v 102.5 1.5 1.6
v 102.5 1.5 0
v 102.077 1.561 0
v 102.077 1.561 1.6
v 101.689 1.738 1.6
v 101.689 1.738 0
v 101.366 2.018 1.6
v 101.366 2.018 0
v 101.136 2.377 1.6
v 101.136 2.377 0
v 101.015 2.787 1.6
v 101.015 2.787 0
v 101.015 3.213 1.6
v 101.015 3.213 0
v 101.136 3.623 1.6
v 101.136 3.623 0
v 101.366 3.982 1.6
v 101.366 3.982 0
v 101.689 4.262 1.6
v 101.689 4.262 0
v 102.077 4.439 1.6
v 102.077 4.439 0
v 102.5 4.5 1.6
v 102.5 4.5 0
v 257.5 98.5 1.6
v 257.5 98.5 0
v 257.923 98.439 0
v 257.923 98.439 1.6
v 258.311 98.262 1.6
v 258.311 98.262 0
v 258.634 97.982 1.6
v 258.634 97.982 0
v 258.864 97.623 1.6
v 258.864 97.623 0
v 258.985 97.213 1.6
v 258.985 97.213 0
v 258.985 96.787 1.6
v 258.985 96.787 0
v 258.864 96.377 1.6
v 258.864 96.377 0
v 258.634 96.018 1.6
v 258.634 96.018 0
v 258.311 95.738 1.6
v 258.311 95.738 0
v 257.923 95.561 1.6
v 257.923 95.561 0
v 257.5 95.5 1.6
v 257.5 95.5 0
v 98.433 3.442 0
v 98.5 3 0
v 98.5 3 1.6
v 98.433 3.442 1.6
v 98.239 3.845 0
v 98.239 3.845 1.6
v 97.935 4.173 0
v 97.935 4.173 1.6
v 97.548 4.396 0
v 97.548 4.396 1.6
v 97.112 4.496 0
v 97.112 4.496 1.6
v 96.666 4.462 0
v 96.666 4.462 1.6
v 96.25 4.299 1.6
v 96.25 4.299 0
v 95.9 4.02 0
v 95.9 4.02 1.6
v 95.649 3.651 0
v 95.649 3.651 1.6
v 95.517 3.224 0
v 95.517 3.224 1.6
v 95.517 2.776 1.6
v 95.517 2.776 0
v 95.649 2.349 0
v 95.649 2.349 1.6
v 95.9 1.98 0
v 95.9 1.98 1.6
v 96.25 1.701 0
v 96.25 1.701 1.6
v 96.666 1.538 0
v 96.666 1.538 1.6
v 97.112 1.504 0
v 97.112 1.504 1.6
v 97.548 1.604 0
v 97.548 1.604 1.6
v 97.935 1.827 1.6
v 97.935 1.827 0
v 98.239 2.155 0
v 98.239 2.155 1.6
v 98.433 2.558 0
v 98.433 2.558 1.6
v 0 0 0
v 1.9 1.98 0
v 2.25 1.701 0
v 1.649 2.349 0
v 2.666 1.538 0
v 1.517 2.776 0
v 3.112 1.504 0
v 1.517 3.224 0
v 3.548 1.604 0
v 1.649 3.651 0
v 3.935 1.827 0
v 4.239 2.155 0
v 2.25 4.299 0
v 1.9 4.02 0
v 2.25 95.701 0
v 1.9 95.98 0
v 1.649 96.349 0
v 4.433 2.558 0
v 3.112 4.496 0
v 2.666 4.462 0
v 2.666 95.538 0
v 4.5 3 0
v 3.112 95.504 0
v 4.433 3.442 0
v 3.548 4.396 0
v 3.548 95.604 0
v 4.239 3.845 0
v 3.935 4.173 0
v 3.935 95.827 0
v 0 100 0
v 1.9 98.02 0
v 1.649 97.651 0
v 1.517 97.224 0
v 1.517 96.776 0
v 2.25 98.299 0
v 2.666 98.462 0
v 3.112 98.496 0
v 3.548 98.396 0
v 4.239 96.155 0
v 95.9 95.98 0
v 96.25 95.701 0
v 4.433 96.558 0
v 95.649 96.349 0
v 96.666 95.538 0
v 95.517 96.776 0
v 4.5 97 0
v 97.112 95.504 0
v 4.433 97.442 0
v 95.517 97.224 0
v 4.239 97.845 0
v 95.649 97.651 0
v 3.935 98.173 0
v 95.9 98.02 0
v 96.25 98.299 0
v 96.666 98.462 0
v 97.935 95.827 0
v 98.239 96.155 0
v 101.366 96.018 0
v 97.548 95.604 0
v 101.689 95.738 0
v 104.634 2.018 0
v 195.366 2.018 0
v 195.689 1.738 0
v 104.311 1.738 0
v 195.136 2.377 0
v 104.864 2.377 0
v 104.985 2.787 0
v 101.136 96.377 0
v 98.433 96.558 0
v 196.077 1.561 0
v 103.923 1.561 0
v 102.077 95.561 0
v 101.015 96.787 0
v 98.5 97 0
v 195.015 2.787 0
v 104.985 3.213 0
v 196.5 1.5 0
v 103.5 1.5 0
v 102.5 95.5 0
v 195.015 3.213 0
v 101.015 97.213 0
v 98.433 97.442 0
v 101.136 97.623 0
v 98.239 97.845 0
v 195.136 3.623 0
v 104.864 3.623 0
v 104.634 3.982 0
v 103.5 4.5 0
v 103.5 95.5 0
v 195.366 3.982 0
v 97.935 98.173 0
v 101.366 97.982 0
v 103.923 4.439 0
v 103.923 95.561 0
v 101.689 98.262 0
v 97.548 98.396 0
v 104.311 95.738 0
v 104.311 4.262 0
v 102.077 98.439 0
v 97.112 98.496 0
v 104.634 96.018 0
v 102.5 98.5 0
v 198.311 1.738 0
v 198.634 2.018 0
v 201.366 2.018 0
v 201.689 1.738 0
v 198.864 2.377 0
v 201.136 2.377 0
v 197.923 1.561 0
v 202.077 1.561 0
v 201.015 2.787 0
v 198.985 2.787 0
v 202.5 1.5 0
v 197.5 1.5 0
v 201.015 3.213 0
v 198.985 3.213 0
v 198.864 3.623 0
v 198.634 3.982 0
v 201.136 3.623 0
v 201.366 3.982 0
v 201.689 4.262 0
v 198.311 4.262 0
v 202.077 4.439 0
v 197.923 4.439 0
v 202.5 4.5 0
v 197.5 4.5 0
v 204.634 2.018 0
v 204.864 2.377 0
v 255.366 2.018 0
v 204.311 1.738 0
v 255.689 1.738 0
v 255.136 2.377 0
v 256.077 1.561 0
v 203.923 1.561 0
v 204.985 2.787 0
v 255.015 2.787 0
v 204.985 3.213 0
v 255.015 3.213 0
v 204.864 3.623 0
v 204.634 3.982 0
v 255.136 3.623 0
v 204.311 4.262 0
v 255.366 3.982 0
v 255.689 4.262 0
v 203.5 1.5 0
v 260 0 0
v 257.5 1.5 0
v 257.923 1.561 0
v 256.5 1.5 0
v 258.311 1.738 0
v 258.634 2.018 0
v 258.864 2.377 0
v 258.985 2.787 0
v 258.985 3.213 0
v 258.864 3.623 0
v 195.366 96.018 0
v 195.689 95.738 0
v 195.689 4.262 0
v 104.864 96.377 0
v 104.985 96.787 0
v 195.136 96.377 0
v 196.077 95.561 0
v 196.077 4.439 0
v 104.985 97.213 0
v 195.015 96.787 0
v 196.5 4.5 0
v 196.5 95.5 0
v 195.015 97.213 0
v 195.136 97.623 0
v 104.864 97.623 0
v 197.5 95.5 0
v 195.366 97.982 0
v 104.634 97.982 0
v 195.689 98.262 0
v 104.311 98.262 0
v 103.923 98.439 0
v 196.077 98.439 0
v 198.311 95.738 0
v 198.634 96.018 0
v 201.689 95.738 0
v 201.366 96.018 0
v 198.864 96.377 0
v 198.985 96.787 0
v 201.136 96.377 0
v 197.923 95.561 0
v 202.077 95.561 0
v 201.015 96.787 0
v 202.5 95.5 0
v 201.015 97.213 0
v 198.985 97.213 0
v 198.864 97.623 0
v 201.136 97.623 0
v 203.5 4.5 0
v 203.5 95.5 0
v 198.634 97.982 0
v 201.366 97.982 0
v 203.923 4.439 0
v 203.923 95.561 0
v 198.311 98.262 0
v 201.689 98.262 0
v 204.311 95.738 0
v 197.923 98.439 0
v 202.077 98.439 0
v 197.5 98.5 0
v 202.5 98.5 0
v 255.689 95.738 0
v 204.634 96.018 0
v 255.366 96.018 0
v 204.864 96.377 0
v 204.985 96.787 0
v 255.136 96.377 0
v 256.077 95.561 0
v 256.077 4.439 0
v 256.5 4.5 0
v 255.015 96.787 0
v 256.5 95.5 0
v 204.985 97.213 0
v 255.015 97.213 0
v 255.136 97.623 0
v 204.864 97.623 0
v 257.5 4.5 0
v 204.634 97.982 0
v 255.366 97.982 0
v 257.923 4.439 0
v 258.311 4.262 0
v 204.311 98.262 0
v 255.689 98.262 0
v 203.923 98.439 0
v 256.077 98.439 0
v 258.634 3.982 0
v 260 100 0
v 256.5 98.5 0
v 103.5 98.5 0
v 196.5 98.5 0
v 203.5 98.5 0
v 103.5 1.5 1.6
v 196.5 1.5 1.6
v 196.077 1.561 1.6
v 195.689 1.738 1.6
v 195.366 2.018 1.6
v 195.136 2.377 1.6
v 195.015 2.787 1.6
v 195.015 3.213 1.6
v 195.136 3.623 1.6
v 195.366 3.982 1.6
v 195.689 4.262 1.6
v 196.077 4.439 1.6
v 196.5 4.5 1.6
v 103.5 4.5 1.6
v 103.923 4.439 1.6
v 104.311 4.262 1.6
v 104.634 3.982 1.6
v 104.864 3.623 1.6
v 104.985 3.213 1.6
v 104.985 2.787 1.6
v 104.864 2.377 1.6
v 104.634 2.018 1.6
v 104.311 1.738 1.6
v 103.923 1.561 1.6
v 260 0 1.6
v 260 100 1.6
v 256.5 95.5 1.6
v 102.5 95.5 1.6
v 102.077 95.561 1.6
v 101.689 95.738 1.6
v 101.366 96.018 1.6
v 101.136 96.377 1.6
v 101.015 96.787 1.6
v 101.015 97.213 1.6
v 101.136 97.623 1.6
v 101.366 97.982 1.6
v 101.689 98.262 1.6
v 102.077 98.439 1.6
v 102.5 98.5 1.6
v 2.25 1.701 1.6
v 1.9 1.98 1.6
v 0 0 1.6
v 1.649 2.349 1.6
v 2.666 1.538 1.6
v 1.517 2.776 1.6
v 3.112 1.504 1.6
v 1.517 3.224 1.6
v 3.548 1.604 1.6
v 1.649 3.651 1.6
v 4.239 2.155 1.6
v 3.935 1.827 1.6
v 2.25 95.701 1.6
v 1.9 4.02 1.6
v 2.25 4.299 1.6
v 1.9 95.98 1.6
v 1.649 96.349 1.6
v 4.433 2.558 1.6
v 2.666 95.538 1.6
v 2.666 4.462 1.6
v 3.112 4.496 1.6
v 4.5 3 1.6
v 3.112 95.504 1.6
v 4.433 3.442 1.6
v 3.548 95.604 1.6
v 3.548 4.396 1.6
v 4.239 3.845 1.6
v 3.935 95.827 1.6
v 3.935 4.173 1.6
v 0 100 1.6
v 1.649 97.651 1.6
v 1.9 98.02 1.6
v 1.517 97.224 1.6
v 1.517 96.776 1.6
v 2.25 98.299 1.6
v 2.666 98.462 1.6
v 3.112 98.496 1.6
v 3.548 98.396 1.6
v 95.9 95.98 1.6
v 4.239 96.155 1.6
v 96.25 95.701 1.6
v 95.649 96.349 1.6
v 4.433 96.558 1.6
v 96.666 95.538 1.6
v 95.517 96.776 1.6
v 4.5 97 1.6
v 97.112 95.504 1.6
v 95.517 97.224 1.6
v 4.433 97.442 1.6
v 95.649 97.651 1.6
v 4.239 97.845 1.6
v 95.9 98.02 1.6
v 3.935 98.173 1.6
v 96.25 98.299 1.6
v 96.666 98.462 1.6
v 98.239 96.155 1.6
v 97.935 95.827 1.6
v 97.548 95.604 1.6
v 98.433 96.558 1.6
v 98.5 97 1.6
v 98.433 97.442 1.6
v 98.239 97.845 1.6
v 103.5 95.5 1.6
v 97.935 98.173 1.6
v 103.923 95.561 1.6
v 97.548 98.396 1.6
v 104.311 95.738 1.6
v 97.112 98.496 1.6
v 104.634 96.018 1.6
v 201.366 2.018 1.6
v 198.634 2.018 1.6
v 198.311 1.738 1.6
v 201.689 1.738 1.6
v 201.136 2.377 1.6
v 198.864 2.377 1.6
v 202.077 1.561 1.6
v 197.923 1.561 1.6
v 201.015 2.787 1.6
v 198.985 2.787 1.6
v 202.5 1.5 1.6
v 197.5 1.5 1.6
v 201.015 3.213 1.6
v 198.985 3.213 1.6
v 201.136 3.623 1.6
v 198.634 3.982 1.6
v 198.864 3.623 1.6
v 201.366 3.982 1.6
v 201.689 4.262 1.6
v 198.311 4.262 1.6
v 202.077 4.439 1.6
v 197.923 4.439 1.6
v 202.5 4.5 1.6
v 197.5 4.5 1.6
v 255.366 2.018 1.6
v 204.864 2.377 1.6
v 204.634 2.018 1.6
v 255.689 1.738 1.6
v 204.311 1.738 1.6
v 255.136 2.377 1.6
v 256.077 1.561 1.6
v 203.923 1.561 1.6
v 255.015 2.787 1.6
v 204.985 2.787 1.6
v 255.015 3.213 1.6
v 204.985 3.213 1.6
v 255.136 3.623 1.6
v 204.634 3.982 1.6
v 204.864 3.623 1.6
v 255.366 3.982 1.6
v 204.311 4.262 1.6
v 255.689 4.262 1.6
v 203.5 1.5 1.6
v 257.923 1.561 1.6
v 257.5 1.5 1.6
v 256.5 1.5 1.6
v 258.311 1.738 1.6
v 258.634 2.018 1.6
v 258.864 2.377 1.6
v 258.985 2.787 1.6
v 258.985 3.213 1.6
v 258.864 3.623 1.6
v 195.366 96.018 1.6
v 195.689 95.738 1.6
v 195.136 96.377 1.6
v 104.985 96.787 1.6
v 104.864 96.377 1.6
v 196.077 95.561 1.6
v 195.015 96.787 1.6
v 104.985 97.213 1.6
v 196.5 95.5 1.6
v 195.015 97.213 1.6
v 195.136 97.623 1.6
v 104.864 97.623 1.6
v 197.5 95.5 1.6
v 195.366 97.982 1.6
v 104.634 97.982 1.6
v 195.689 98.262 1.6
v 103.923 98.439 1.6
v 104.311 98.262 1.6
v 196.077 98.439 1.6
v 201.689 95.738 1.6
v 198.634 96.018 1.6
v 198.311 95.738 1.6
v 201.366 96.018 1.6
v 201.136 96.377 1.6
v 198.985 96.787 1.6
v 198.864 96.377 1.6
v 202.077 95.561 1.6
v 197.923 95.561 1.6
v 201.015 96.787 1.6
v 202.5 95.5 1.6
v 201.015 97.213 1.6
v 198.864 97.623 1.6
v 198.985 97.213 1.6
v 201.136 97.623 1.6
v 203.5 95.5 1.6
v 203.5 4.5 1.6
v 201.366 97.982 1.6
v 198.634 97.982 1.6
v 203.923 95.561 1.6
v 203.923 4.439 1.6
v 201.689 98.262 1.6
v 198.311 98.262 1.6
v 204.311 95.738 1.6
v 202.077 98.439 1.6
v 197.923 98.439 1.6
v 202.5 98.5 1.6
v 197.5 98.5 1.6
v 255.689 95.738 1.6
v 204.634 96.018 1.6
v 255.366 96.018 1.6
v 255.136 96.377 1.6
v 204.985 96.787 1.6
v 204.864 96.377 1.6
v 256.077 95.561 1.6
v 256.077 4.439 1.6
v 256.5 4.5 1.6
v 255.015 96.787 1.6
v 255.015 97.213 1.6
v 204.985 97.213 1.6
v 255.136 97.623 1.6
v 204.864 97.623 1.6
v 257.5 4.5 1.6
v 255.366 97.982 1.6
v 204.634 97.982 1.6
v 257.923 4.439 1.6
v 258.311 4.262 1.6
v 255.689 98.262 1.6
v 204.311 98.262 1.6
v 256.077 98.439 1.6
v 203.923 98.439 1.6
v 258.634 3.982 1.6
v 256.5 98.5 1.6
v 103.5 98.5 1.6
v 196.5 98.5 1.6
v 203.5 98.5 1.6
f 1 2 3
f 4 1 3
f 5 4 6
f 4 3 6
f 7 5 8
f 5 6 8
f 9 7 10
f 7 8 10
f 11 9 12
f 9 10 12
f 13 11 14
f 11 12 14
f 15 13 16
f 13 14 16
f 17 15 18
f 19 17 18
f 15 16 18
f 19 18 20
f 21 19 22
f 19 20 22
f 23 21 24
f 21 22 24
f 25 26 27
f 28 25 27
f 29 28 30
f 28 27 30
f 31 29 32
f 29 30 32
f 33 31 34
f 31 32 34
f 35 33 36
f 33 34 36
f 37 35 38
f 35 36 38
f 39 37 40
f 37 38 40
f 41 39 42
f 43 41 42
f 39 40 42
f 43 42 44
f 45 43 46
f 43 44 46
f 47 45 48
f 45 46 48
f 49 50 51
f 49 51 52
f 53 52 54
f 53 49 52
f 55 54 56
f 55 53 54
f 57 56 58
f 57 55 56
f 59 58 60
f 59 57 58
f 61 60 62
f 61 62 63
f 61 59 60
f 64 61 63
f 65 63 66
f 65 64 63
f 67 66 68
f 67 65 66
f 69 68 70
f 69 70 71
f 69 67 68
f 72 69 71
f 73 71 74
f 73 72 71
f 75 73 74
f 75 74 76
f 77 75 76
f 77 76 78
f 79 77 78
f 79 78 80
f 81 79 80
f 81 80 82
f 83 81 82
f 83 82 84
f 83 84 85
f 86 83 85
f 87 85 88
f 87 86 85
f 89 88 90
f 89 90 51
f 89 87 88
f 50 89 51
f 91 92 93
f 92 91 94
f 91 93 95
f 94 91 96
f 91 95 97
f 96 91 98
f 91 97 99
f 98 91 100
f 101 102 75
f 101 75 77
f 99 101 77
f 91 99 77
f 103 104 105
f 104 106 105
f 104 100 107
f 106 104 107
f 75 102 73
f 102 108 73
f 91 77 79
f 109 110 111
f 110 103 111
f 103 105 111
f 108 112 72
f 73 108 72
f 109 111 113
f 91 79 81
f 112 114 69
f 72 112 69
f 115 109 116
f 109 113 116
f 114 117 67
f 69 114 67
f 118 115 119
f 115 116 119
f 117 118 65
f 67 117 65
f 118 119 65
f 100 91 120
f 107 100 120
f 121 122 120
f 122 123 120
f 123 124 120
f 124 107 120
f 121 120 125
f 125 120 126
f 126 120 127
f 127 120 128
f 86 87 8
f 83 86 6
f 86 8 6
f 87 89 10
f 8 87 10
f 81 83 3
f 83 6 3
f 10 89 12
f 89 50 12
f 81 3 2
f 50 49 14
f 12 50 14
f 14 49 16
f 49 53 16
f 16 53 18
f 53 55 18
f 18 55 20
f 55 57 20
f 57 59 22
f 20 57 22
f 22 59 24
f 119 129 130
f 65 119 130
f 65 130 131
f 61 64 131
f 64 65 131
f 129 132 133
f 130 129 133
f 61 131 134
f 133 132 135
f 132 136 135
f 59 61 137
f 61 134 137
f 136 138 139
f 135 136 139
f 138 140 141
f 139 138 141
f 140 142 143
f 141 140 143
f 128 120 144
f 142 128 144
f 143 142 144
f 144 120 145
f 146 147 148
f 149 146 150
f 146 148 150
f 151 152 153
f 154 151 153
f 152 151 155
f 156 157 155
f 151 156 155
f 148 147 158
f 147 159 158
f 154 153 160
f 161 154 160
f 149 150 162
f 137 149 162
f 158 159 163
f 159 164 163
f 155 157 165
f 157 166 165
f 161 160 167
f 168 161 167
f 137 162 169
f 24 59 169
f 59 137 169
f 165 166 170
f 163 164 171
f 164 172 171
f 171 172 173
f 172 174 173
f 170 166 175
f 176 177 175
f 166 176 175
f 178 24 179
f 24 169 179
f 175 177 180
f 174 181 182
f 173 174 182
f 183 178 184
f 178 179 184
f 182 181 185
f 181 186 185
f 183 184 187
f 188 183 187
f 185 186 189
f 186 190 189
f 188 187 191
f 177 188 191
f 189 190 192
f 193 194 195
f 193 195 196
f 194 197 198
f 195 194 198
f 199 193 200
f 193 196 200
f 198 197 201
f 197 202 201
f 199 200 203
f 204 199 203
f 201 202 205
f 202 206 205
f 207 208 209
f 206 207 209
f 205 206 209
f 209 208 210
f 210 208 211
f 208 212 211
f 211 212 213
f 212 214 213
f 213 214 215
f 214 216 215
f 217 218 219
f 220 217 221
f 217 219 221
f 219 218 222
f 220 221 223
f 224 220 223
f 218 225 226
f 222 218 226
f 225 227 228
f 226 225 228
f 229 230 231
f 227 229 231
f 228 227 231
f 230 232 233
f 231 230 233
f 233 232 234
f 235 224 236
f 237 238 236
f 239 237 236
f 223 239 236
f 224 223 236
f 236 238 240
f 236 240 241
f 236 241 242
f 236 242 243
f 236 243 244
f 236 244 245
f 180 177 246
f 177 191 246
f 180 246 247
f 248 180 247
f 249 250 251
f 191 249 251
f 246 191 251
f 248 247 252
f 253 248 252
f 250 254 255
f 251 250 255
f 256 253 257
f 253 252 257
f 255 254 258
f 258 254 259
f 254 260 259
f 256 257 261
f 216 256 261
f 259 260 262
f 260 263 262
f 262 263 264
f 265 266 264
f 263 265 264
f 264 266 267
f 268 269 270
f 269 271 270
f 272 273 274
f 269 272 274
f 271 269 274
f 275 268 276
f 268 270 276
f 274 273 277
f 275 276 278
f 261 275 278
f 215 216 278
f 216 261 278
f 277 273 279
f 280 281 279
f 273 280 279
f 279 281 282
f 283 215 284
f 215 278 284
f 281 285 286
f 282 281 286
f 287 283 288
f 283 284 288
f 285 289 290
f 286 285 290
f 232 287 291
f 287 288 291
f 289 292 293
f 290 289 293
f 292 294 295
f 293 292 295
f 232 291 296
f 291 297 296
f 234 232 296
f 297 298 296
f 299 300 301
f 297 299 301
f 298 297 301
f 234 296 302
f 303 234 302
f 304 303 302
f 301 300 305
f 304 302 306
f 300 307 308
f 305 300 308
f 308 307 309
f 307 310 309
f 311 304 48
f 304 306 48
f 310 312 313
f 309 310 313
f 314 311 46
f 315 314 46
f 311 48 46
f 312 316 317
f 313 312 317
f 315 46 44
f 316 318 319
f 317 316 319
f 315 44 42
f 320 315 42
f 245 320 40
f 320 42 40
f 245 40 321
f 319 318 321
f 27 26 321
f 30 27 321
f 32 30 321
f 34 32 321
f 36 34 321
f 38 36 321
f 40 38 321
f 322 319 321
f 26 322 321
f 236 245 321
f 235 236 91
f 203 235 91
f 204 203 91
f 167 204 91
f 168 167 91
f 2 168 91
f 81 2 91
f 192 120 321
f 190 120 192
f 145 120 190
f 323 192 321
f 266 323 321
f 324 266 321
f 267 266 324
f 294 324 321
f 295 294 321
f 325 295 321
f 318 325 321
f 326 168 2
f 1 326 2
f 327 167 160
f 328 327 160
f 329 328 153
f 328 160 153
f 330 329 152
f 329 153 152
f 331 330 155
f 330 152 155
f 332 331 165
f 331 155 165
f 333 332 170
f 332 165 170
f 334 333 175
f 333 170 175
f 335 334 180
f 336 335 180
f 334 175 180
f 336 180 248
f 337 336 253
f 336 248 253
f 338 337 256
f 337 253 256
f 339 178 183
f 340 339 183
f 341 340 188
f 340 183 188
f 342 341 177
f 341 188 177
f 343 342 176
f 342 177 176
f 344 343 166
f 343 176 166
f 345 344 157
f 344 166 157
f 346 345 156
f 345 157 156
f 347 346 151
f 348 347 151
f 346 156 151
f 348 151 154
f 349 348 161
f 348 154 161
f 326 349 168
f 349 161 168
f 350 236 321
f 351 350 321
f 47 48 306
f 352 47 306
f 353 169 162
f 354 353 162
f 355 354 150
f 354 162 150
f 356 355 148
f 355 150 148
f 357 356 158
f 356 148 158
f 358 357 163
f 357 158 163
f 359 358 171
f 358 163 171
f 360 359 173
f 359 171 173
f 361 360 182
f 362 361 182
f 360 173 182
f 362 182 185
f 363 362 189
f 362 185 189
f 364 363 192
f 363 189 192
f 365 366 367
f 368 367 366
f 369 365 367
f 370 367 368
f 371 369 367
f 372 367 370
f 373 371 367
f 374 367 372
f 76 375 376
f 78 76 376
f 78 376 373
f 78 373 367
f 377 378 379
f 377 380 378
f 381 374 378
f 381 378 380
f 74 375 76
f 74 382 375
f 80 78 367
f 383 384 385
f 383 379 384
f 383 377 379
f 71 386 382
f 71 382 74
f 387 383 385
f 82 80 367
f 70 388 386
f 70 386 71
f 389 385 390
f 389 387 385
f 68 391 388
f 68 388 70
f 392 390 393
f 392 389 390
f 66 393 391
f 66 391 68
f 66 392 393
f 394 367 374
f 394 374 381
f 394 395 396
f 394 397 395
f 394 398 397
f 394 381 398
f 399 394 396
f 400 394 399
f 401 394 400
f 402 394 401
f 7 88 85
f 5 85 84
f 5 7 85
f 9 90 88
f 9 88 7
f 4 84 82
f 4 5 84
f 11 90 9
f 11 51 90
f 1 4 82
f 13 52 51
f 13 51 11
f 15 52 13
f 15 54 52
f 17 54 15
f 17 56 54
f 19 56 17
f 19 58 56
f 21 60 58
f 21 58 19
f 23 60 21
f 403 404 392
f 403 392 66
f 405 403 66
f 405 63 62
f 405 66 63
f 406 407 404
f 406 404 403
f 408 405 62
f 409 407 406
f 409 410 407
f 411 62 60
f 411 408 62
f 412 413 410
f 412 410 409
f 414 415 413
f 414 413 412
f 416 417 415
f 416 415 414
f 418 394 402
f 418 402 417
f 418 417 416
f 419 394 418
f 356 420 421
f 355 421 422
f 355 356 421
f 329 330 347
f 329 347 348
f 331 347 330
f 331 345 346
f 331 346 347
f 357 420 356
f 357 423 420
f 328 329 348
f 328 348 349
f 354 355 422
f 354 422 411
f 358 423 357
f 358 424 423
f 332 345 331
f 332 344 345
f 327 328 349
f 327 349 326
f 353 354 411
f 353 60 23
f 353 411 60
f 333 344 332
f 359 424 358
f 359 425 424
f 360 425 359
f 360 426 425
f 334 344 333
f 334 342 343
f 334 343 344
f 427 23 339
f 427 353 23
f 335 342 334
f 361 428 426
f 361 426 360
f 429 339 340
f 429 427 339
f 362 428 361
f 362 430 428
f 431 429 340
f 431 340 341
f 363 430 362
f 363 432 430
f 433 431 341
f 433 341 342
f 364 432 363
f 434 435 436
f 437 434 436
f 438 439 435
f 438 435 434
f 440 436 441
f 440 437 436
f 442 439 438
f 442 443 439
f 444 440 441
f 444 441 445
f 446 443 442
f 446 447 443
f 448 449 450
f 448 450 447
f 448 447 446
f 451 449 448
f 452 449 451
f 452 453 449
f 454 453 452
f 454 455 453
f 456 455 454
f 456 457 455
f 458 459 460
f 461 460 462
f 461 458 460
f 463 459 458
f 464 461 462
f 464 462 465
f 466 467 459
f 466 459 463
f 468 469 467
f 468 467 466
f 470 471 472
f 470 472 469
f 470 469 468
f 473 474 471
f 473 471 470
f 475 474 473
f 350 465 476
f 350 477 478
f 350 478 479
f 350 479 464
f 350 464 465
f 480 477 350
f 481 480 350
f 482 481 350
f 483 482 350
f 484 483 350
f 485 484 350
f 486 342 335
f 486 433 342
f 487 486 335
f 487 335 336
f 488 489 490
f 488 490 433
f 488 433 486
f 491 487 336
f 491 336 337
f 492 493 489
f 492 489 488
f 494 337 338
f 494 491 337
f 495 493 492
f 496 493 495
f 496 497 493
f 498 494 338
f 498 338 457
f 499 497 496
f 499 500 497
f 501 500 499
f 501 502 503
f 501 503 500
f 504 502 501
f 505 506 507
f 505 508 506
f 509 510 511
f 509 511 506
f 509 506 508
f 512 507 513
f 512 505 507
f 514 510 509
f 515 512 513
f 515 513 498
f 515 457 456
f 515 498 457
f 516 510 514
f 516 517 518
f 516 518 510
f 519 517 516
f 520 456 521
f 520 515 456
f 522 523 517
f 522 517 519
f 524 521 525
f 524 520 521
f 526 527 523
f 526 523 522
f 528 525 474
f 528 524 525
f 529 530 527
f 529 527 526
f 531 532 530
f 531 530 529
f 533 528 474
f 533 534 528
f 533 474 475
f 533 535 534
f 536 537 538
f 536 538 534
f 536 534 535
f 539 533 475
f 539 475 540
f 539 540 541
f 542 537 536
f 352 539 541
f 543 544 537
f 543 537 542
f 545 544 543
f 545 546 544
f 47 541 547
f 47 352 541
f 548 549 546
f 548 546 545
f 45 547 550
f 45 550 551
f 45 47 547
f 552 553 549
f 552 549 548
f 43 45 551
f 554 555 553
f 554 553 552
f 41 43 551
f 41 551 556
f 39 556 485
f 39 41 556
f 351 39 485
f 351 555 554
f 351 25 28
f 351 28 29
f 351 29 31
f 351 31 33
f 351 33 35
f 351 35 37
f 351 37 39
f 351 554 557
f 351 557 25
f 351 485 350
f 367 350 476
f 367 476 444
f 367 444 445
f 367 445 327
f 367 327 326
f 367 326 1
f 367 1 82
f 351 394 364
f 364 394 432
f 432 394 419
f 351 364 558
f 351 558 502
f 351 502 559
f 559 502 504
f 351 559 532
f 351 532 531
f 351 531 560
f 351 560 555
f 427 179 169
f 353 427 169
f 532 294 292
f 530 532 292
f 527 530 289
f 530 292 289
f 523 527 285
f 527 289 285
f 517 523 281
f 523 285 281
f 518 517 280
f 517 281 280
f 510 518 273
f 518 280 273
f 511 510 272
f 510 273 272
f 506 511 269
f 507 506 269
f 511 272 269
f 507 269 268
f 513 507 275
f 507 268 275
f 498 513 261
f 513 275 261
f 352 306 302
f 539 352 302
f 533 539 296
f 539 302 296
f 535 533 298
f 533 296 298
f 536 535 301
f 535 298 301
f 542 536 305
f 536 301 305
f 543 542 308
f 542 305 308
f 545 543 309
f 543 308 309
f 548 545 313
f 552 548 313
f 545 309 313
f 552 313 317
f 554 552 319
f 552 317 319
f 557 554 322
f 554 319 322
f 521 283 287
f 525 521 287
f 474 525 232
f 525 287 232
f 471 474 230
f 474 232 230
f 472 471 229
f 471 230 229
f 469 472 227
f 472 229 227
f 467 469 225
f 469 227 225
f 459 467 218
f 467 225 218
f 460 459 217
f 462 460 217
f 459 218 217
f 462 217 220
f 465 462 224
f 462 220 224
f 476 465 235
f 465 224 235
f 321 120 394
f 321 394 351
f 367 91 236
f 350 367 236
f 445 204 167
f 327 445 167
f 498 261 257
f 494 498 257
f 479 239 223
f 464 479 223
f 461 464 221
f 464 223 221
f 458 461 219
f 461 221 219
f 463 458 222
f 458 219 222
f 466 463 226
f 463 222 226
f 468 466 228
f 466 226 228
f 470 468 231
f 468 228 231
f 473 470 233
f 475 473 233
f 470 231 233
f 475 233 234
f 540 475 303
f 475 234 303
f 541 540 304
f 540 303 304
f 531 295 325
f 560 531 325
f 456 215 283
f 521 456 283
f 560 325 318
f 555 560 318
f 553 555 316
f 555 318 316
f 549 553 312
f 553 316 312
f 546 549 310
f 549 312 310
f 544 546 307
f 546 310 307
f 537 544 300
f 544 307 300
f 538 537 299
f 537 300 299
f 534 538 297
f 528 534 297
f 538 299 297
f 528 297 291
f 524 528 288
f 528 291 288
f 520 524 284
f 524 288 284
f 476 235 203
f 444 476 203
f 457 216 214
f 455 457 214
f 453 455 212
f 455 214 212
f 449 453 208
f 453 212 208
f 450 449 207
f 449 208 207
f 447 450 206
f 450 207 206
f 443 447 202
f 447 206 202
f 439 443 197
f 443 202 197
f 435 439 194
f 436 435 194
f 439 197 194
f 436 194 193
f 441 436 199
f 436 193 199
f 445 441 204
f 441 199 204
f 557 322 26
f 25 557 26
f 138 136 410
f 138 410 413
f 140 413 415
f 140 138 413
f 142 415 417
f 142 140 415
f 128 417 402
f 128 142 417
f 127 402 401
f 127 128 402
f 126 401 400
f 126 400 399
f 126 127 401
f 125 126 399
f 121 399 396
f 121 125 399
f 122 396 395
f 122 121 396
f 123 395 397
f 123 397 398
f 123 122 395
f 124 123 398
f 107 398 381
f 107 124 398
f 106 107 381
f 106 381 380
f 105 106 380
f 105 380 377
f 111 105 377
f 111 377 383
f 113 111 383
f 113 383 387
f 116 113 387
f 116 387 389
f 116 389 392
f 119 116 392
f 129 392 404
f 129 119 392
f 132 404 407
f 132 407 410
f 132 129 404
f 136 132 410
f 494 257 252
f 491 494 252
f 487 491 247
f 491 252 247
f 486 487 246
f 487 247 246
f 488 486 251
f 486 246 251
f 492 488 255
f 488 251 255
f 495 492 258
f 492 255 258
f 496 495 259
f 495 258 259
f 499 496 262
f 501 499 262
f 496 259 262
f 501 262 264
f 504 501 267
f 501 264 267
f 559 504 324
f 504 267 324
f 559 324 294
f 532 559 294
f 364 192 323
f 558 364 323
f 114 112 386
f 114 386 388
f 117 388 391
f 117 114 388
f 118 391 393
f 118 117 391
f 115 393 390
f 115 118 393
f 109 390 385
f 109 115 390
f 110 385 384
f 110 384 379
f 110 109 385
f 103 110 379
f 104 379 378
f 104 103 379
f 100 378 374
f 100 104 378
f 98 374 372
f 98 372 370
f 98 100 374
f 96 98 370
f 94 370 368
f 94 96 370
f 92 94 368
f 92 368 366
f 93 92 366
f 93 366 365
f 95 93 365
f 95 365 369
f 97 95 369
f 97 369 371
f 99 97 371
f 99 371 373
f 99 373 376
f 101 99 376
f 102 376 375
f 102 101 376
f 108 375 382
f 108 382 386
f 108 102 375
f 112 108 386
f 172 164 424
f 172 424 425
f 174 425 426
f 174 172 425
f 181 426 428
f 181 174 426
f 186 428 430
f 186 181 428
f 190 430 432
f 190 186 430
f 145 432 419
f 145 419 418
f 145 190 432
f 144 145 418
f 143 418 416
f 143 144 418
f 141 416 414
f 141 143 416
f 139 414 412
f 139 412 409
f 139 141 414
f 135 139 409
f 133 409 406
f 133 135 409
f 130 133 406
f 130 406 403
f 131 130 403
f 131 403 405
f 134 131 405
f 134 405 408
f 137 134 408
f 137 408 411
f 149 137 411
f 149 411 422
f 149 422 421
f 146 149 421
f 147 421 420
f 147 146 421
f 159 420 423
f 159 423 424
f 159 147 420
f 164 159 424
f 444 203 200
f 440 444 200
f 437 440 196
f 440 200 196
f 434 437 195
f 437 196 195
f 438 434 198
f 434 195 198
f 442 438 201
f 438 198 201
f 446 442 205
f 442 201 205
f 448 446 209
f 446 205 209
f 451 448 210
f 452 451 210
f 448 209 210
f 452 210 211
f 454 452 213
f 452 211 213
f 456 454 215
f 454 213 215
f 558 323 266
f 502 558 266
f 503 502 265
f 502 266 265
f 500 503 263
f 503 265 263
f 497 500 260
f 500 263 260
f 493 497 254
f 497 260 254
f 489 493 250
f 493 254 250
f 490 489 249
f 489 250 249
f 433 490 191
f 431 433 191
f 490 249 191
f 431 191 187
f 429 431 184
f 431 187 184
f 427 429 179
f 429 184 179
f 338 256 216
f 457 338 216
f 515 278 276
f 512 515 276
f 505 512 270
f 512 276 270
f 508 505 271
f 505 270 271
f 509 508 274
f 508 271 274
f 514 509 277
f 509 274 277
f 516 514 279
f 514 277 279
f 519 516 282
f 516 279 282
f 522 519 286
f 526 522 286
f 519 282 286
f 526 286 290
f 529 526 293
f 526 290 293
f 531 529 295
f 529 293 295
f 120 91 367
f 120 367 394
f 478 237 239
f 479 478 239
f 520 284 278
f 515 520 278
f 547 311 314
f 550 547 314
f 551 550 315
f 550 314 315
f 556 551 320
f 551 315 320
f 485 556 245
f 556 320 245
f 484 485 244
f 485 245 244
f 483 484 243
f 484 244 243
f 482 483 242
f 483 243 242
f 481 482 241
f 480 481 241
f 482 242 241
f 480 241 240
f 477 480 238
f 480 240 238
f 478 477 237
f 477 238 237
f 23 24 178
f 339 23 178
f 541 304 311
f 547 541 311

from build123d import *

# Parameters (mm, degrees)
SKETCH_1_W      = 260
SKETCH_1_H      = 100
SKETCH_1_R      = 1.5
EXTRUDE_1_DEPTH = 1.6


with BuildPart() as part:
    # 草图1 → 凸台-拉伸1 (new body)
    with BuildSketch(Plane.XY):
        with Locations((130, 50)):
            Rectangle(SKETCH_1_W, SKETCH_1_H)
        with Locations((3, 3)):
            Circle(SKETCH_1_R, mode=Mode.SUBTRACT)
        with Locations((3, 97)):
            Circle(SKETCH_1_R, mode=Mode.SUBTRACT)
        with Locations((97, 97)):
            Circle(SKETCH_1_R, mode=Mode.SUBTRACT)
        with Locations((97, 3)):
            Circle(SKETCH_1_R, mode=Mode.SUBTRACT)
        with BuildLine():
            Line((102.5, 98.5), (103.5, 98.5))
            ThreePointArc((103.5, 98.5), (105, 97), (103.5, 95.5))
            Line((103.5, 95.5), (102.5, 95.5))
            ThreePointArc((102.5, 95.5), (101, 97), (102.5, 98.5))
        make_face(mode=Mode.SUBTRACT)
        with BuildLine():
            Line((102.5, 4.5), (103.5, 4.5))
            ThreePointArc((103.5, 4.5), (105, 3), (103.5, 1.5))
            Line((103.5, 1.5), (102.5, 1.5))
            ThreePointArc((102.5, 1.5), (101, 3), (102.5, 4.5))
        make_face(mode=Mode.SUBTRACT)
        with BuildLine():
            Line((196.5, 98.5), (197.5, 98.5))
            ThreePointArc((197.5, 98.5), (199, 97), (197.5, 95.5))
            Line((197.5, 95.5), (196.5, 95.5))
            ThreePointArc((196.5, 95.5), (195, 97), (196.5, 98.5))
        make_face(mode=Mode.SUBTRACT)
        with BuildLine():
            Line((196.5, 4.5), (197.5, 4.5))
            ThreePointArc((197.5, 4.5), (199, 3), (197.5, 1.5))
            Line((197.5, 1.5), (196.5, 1.5))
            ThreePointArc((196.5, 1.5), (195, 3), (196.5, 4.5))
        make_face(mode=Mode.SUBTRACT)
        with BuildLine():
            Line((202.5, 4.5), (203.5, 4.5))
            ThreePointArc((203.5, 4.5), (205, 3), (203.5, 1.5))
            Line((203.5, 1.5), (202.5, 1.5))
            ThreePointArc((202.5, 1.5), (201, 3), (202.5, 4.5))
        make_face(mode=Mode.SUBTRACT)
        with BuildLine():
            Line((202.5, 98.5), (203.5, 98.5))
            ThreePointArc((203.5, 98.5), (205, 97), (203.5, 95.5))
            Line((203.5, 95.5), (202.5, 95.5))
            ThreePointArc((202.5, 95.5), (201, 97), (202.5, 98.5))
        make_face(mode=Mode.SUBTRACT)
        with BuildLine():
            Line((257.5, 95.5), (256.5, 95.5))
            ThreePointArc((256.5, 95.5), (255, 97), (256.5, 98.5))
            Line((256.5, 98.5), (257.5, 98.5))
            ThreePointArc((257.5, 98.5), (259, 97), (257.5, 95.5))
        make_face(mode=Mode.SUBTRACT)
        with BuildLine():
            Line((257.5, 1.5), (256.5, 1.5))
            ThreePointArc((256.5, 1.5), (255, 3), (256.5, 4.5))
            Line((256.5, 4.5), (257.5, 4.5))
            ThreePointArc((257.5, 4.5), (259, 3), (257.5, 1.5))
        make_face(mode=Mode.SUBTRACT)
    extrude(amount=EXTRUDE_1_DEPTH)


solid = part.part
